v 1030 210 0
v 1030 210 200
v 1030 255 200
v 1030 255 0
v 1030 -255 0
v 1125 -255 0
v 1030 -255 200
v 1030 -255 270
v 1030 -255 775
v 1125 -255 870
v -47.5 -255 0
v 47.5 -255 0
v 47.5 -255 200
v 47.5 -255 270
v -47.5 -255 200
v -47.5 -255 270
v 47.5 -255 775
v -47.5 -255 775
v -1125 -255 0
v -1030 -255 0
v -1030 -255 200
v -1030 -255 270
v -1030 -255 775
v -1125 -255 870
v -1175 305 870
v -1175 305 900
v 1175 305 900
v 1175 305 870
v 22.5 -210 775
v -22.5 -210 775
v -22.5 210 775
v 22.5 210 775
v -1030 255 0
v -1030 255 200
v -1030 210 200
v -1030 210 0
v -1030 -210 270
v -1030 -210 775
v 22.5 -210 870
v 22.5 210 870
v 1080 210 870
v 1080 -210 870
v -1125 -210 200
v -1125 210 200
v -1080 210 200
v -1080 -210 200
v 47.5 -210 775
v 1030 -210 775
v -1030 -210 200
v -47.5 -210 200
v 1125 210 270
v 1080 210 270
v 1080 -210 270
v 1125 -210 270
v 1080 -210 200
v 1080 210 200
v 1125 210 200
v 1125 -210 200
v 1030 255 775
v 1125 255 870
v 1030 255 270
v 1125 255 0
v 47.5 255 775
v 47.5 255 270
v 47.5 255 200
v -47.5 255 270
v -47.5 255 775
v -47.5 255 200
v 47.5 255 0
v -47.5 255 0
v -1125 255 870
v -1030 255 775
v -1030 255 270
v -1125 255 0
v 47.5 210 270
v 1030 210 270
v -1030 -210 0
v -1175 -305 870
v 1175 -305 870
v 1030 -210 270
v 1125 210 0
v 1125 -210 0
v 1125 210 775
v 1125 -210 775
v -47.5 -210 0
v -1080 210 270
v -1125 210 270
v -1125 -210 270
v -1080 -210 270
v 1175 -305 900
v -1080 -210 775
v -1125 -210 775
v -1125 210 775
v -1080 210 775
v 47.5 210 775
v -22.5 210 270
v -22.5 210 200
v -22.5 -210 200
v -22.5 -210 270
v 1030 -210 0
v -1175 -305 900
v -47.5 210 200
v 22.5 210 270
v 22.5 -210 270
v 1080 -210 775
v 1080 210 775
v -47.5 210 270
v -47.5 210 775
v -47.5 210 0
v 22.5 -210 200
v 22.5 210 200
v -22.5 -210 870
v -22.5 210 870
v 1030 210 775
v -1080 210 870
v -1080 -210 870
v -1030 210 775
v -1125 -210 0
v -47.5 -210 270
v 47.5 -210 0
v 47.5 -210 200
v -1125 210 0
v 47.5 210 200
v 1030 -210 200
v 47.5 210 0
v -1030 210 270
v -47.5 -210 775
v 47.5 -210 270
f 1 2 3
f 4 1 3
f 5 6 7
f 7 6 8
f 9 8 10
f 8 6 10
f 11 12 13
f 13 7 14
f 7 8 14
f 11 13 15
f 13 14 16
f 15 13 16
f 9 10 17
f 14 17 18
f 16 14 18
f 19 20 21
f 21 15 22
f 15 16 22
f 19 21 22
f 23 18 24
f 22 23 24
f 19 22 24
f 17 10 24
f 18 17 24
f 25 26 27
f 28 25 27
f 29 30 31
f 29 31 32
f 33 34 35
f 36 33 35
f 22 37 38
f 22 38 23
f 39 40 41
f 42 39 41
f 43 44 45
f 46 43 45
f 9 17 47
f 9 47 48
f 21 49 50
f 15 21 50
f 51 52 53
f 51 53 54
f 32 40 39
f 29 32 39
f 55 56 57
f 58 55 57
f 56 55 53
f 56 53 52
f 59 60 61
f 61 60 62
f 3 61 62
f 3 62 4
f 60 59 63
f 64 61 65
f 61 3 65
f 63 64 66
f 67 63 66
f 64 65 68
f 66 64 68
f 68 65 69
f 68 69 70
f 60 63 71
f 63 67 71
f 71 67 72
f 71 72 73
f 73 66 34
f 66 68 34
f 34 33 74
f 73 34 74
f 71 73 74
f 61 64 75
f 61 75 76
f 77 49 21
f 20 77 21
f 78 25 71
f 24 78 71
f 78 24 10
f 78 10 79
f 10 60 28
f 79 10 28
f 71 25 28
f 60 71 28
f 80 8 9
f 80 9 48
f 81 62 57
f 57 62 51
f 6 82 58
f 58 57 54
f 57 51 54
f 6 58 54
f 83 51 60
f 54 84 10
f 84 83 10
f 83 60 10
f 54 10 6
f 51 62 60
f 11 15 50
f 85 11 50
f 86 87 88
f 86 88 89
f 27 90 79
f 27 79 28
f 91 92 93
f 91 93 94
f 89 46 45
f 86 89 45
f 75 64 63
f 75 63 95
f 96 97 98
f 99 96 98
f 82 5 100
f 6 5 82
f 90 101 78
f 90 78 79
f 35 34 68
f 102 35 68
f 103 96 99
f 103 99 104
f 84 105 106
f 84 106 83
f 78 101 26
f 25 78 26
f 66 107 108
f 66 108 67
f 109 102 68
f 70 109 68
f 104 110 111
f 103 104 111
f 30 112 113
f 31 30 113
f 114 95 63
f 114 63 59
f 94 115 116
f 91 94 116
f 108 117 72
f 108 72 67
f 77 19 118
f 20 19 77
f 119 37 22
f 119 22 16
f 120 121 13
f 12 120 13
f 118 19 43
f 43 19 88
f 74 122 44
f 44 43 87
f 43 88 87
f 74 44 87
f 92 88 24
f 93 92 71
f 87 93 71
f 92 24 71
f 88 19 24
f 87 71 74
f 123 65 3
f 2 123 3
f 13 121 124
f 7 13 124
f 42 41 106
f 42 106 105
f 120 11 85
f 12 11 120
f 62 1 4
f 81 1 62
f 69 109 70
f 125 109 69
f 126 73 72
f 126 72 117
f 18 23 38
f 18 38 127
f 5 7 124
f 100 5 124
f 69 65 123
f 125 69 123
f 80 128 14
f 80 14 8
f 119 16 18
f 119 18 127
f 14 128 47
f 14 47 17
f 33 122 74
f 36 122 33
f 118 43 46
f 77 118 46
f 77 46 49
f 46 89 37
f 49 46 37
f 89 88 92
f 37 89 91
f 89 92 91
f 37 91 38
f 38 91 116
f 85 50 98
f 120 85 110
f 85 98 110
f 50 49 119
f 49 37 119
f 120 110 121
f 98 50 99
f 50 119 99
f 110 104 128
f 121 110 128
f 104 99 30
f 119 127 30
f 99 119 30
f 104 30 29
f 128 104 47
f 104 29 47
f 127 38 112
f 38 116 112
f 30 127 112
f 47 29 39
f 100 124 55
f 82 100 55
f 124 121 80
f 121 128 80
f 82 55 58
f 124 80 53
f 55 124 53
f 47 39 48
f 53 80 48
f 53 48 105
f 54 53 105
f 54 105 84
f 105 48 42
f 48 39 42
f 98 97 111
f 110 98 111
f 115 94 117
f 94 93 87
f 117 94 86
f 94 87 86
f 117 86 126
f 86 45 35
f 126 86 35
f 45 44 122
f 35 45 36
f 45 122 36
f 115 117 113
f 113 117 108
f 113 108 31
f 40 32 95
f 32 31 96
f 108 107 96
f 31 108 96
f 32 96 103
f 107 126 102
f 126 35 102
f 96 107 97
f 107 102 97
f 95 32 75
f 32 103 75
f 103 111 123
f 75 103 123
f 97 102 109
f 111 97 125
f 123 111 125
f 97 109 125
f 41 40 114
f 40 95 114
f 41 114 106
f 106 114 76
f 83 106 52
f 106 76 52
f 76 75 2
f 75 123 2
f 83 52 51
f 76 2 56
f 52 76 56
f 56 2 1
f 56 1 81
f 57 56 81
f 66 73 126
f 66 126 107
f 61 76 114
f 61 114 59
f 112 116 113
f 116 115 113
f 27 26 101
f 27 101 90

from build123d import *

# Parameters (mm, degrees)
F1_W     = 2350
F1_H     = 610
F2_DEPTH = 30
F3_W     = 45
F3_H     = 420
F3_W_2   = 982.5
F3_H_2   = 45
F4_DEPTH = 95
F5_DEPTH = 870
F7_W     = 982.5
F7_H     = 45
F7_W_2   = 45
F7_H_2   = 420
F8_DEPTH = 70


# Not quite as in the source:
# - a feature names something its author has since deleted; it is built from what else it names


with BuildPart() as f2:
    # F1 (on offset) → F2 (new body)
    with BuildSketch(Plane.XY.offset(900)):
        Rectangle(F1_W, F1_H)
    extrude(amount=-F2_DEPTH)

    # F3 (on face) → F4 (join)
    with BuildSketch(Plane(origin=(0, 0, 870), x_dir=(1, 0, 0), z_dir=(0, 0, -1))):
        with Locations((-1102.5, 0)):
            Rectangle(F3_W, F3_H)
        with Locations((1102.5, 0)):
            Rectangle(F3_W, F3_H)
        with Locations((-538.75, 232.5)):
            Rectangle(F3_W_2, F3_H_2)
        with Locations((-538.75, -232.5)):
            Rectangle(F3_W_2, F3_H_2)
        Polygon((22.5, 210), (-22.5, 210), (-22.5, -210), (22.5, -210), (22.5, -47.5), (22.5, 47.5), align=None)
        with Locations((538.75, 232.5)):
            Rectangle(F3_W_2, F3_H_2)
        with Locations((538.75, -232.5)):
            Rectangle(F3_W_2, F3_H_2)
    extrude(amount=F4_DEPTH)

    # F3 (on face) → F5 (join)
    with BuildSketch(Plane(origin=(0, 0, 870), x_dir=(1, 0, 0), z_dir=(0, 0, -1))):
        Polygon((-1030, 255), (-1125, 255), (-1125, 210), (-1080, 210), (-1030, 210), align=None)
        Polygon((47.5, 255), (-47.5, 255), (-47.5, 210), (-22.5, 210), (22.5, 210), (47.5, 210), align=None)
        Polygon((-1080, -210), (-1125, -210), (-1125, -255), (-1030, -255), (-1030, -210), align=None)
        Polygon((1125, 255), (1030, 255), (1030, 210), (1080, 210), (1125, 210), align=None)
        Polygon((22.5, -210), (-22.5, -210), (-47.5, -210), (-47.5, -255), (47.5, -255), (47.5, -210), align=None)
        Polygon((1125, -210), (1080, -210), (1030, -210), (1030, -255), (1125, -255), align=None)
    extrude(amount=F5_DEPTH)

    # F7 (on offset) → F8 (join)
    with BuildSketch(Plane.XY.offset(200)):
        with Locations((-538.75, 232.5)):
            Rectangle(F7_W, F7_H)
        Polygon((22.5, 255), (-47.5, 255), (-47.5, 210), (-22.5, 210), (22.5, 210), (47.5, 210), (47.5, 255), align=None)
        Polygon((67.5, 255), (47.5, 255), (47.5, 210), (67.5, 210), (1030, 210), (1030, 255), align=None)
        Polygon((22.5, 210), (-22.5, 210), (-22.5, -210), (22.5, -210), (22.5, -47.5), (22.5, 47.5), align=None)
        Polygon((22.5, -210), (-22.5, -210), (-47.5, -210), (-47.5, -255), (22.5, -255), (47.5, -255), (47.5, -210), align=None)
        with Locations((-538.75, -232.5)):
            Rectangle(F7_W, F7_H)
        Polygon((67.5, -210), (47.5, -210), (47.5, -255), (1030, -255), (1030, -210), align=None)
        with Locations((-1102.5, 0)):
            Rectangle(F7_W_2, F7_H_2)
        with Locations((1102.5, 0)):
            Rectangle(F7_W_2, F7_H_2)
    extrude(amount=F8_DEPTH)


solid = f2.part
